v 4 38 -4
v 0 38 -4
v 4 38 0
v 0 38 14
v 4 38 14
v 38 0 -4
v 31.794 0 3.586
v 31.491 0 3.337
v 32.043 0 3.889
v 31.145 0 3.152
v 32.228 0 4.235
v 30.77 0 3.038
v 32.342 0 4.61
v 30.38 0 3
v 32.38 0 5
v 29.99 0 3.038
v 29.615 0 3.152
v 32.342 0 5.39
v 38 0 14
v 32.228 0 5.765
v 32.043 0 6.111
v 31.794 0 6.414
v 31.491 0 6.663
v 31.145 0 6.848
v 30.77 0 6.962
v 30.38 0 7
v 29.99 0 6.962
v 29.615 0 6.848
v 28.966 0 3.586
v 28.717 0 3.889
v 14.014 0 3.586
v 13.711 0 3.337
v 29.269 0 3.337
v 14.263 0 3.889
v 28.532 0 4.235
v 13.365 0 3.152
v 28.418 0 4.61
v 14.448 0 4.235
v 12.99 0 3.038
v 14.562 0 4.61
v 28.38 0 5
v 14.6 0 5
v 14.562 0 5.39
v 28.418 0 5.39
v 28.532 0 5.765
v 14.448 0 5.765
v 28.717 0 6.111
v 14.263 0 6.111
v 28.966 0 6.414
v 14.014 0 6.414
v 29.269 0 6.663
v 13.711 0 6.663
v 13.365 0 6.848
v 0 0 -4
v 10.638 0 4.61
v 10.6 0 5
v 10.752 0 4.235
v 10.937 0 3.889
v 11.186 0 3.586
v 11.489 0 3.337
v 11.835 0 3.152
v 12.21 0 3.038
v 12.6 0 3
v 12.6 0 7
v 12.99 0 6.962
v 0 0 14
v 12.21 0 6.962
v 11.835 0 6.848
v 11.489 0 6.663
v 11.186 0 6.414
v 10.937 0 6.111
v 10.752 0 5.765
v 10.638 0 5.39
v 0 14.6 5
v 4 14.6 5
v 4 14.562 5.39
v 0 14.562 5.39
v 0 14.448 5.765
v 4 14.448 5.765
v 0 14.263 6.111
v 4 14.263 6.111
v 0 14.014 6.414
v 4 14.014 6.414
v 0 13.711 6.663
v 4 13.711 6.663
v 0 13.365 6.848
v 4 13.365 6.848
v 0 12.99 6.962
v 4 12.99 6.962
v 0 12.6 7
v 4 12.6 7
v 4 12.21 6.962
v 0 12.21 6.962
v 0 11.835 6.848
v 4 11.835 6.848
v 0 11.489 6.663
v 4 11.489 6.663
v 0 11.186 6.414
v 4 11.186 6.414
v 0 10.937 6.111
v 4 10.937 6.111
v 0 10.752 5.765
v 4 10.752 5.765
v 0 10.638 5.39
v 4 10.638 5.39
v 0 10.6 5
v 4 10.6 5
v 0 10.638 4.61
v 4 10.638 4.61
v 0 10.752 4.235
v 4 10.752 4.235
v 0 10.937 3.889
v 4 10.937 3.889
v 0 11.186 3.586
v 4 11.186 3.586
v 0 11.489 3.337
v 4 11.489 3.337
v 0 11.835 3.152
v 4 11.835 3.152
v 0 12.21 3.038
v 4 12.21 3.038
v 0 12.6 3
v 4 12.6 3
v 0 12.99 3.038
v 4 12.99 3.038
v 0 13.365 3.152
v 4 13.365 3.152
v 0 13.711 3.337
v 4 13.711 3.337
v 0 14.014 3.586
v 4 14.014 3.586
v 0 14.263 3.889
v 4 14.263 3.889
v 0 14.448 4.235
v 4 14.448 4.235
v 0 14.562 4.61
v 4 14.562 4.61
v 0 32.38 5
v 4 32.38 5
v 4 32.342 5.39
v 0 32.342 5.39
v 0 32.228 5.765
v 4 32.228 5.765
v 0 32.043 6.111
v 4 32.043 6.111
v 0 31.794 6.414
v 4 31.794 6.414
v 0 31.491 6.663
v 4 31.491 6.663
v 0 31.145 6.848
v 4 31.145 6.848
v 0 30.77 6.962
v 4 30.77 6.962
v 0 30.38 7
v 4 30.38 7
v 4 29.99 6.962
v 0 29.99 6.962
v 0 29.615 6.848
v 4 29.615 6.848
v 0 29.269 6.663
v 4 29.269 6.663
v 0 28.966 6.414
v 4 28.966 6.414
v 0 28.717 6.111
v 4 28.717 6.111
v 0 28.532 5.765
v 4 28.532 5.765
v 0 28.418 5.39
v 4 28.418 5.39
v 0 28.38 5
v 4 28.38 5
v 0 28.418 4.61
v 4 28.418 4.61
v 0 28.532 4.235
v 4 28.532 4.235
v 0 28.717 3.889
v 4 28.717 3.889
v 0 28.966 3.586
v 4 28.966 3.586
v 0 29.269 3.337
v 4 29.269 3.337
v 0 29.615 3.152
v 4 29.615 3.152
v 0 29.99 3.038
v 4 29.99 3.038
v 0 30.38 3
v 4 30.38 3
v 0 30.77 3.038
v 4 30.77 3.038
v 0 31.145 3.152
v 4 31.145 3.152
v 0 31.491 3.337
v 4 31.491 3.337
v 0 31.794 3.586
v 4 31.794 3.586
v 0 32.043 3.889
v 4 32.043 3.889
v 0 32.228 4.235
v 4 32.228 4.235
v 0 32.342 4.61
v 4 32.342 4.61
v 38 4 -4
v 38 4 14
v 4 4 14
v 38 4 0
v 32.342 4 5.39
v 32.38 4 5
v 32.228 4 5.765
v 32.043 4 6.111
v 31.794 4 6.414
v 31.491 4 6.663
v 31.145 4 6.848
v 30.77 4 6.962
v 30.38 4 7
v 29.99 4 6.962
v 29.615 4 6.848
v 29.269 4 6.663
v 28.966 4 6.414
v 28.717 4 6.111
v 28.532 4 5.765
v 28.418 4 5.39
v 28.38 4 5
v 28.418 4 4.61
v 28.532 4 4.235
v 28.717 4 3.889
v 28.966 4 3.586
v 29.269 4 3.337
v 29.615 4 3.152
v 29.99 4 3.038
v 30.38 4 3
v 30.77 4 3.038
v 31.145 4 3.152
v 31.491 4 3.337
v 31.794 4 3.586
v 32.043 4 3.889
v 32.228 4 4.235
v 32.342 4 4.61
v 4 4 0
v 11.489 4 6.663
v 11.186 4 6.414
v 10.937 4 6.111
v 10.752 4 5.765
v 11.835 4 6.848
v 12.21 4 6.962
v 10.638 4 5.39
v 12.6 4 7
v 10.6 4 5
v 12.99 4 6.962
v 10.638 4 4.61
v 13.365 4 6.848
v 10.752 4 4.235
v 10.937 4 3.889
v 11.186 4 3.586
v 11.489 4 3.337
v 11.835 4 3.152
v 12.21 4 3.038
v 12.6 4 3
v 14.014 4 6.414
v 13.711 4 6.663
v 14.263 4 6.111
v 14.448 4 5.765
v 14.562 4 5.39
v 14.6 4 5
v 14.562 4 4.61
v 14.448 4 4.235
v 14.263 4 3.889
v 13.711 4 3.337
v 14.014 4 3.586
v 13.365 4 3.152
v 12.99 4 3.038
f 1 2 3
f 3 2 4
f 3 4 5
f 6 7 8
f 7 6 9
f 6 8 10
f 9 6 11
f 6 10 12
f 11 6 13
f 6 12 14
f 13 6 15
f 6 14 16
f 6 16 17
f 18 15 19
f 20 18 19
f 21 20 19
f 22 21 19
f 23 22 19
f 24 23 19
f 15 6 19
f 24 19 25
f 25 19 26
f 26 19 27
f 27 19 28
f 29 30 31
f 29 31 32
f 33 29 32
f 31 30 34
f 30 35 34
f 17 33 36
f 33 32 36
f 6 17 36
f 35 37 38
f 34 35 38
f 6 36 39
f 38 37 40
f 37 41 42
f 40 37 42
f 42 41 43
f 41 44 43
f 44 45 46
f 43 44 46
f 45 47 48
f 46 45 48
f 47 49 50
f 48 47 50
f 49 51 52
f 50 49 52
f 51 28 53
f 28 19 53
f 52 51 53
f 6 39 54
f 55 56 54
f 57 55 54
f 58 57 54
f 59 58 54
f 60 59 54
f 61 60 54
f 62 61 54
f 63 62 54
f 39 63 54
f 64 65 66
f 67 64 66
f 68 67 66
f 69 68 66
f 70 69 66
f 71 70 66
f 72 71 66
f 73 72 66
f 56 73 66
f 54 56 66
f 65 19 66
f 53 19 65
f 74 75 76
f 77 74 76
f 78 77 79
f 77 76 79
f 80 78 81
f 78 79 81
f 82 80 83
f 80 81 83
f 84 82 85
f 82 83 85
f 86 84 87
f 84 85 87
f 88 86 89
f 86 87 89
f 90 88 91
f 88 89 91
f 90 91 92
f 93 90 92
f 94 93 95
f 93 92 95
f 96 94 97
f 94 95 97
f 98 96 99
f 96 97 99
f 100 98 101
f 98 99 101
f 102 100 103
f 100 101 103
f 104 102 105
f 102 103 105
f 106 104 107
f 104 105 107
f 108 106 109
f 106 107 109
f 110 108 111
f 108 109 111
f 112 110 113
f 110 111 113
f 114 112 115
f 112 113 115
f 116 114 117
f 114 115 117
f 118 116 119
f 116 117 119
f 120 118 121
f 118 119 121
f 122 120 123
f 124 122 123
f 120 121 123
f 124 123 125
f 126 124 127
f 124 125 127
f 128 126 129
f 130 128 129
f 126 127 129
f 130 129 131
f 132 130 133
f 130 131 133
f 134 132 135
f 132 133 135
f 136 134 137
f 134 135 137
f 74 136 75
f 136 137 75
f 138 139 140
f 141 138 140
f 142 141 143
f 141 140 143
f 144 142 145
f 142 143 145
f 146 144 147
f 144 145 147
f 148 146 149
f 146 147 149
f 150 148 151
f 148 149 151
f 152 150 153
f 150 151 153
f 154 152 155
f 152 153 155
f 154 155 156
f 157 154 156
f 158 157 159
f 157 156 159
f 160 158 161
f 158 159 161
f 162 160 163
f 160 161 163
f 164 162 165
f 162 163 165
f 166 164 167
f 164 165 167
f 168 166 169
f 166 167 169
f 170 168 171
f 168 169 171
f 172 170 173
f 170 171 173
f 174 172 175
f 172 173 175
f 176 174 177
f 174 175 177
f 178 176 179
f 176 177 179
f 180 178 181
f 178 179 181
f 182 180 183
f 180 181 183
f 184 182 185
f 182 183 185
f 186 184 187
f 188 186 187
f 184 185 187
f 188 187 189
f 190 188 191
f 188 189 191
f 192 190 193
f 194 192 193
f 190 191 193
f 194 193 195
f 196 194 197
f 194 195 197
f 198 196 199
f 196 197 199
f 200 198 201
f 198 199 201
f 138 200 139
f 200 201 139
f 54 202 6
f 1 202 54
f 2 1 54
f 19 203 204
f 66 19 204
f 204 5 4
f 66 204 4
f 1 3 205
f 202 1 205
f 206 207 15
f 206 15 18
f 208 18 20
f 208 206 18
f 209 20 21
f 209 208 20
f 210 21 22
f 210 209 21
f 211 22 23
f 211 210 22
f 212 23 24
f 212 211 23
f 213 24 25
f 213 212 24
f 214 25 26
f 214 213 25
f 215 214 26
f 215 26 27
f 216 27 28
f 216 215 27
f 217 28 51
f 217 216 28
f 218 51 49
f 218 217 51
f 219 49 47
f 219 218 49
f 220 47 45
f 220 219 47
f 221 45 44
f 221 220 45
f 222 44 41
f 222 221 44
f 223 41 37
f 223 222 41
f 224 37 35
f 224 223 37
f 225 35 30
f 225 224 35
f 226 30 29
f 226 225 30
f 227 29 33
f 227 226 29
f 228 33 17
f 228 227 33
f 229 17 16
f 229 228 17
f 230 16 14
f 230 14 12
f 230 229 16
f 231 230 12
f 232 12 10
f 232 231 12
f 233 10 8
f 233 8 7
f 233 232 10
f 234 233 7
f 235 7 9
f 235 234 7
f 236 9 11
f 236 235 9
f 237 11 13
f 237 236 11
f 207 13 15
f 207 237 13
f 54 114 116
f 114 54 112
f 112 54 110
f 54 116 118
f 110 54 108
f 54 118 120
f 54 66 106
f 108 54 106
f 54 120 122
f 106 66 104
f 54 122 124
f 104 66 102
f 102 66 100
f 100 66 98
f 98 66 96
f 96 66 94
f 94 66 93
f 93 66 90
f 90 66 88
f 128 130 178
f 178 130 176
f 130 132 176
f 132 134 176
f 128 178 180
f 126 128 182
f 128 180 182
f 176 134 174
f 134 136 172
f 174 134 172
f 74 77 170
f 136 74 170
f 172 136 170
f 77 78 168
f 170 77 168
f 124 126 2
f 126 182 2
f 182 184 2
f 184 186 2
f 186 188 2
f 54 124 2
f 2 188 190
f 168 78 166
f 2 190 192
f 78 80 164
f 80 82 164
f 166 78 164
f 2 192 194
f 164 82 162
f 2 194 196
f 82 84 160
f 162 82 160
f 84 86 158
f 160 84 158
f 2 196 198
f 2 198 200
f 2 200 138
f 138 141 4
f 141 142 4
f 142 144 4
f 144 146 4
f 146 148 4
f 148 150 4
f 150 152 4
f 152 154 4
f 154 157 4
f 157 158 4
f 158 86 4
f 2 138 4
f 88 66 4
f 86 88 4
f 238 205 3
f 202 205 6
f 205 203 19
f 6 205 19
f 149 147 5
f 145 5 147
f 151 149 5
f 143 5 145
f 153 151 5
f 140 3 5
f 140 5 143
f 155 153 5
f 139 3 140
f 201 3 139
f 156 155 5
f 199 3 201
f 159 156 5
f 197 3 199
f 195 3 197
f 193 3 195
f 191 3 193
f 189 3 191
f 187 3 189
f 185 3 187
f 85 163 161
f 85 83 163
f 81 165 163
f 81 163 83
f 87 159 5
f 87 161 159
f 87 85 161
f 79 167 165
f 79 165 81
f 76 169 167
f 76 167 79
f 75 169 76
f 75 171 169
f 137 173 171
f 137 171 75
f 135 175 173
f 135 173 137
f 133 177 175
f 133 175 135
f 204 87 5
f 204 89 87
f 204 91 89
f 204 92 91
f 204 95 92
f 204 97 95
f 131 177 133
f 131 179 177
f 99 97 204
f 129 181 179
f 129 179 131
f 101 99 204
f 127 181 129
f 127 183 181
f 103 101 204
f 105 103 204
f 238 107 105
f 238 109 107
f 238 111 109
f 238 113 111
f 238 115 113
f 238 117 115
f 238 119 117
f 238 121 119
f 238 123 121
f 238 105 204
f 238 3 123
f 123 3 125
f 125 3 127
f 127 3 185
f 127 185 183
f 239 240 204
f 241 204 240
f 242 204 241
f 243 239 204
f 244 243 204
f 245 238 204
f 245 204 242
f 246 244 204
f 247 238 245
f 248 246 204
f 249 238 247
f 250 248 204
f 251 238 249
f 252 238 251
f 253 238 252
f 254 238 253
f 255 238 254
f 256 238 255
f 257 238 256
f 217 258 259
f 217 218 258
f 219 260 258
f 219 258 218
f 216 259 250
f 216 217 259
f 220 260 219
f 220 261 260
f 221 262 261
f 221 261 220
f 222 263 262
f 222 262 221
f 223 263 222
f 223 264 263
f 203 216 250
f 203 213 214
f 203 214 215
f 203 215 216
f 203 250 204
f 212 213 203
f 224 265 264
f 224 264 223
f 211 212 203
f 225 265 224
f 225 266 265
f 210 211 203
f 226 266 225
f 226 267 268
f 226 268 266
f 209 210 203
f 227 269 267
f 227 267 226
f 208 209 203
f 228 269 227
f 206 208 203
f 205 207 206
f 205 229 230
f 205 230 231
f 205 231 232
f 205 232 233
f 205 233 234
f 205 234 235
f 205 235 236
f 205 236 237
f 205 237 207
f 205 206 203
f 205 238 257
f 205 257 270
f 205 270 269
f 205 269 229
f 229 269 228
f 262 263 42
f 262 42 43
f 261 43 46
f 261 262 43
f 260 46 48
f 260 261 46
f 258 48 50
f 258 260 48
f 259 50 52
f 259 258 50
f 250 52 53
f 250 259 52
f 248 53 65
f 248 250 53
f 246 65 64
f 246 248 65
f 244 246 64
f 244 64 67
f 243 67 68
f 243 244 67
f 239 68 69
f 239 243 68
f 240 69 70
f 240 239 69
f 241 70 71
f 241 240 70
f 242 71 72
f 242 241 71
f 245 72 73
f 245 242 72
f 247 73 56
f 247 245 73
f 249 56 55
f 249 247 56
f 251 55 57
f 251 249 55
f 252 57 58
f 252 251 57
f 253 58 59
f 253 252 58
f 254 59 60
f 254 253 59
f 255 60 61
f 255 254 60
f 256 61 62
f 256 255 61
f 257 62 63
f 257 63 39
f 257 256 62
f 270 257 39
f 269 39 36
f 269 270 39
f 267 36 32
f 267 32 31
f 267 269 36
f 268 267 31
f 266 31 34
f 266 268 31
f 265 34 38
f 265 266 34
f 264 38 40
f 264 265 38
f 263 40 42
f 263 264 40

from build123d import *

# Parameters (mm, degrees)
BOSS_EXTRUDE1_DEPTH = 14
BOSS_EXTRUDE2_DEPTH = 4
SKETCH3_R           = 2
CUT_EXTRUDE1_DEPTH  = 4


with BuildPart() as part:
    # Sketch1 → Boss-Extrude1 (new body)
    with BuildSketch(Plane.XY):
        Polygon((0, 0), (0, 38), (4, 38), (4, 4), (38, 4), (38, 0), align=None)
    extrude(amount=BOSS_EXTRUDE1_DEPTH)

    # Sketch2 → Boss-Extrude2 (add)
    with BuildSketch(Plane(origin=(0, 0, 0), x_dir=(-1, 0, 0), z_dir=(0, 0, -1))):
        Polygon((-4, 38), (-38, 4), (-4, 4), align=None)
        Polygon((-38, 4), (-38, 0), (0, 0), (0, 38), (-4, 38), (-4, 4), align=None)
    extrude(amount=BOSS_EXTRUDE2_DEPTH)

    # Sketch3 → Cut-Extrude1 (cut)
    with BuildSketch(Plane(origin=(4, 0, 0), x_dir=(0, 0, -1), z_dir=(1, 0, 0))):
        with Locations(Location((-5, 30.38, 0), (0, 0, 90))):
            Circle(SKETCH3_R)
        with Locations(Location((-5, 12.6, 0), (0, 0, 90))):
            Circle(SKETCH3_R)
    cut_extrude1 = extrude(amount=-CUT_EXTRUDE1_DEPTH, mode=Mode.SUBTRACT)

    # Mirror4: Cut-Extrude1 across plane
    add(cut_extrude1.mirror(Plane(origin=(0, 0, 0), x_dir=(0, 0, 1), z_dir=(0.7071067811865438, -0.7071067811865512, 0))), mode=Mode.SUBTRACT)


solid = part.part
